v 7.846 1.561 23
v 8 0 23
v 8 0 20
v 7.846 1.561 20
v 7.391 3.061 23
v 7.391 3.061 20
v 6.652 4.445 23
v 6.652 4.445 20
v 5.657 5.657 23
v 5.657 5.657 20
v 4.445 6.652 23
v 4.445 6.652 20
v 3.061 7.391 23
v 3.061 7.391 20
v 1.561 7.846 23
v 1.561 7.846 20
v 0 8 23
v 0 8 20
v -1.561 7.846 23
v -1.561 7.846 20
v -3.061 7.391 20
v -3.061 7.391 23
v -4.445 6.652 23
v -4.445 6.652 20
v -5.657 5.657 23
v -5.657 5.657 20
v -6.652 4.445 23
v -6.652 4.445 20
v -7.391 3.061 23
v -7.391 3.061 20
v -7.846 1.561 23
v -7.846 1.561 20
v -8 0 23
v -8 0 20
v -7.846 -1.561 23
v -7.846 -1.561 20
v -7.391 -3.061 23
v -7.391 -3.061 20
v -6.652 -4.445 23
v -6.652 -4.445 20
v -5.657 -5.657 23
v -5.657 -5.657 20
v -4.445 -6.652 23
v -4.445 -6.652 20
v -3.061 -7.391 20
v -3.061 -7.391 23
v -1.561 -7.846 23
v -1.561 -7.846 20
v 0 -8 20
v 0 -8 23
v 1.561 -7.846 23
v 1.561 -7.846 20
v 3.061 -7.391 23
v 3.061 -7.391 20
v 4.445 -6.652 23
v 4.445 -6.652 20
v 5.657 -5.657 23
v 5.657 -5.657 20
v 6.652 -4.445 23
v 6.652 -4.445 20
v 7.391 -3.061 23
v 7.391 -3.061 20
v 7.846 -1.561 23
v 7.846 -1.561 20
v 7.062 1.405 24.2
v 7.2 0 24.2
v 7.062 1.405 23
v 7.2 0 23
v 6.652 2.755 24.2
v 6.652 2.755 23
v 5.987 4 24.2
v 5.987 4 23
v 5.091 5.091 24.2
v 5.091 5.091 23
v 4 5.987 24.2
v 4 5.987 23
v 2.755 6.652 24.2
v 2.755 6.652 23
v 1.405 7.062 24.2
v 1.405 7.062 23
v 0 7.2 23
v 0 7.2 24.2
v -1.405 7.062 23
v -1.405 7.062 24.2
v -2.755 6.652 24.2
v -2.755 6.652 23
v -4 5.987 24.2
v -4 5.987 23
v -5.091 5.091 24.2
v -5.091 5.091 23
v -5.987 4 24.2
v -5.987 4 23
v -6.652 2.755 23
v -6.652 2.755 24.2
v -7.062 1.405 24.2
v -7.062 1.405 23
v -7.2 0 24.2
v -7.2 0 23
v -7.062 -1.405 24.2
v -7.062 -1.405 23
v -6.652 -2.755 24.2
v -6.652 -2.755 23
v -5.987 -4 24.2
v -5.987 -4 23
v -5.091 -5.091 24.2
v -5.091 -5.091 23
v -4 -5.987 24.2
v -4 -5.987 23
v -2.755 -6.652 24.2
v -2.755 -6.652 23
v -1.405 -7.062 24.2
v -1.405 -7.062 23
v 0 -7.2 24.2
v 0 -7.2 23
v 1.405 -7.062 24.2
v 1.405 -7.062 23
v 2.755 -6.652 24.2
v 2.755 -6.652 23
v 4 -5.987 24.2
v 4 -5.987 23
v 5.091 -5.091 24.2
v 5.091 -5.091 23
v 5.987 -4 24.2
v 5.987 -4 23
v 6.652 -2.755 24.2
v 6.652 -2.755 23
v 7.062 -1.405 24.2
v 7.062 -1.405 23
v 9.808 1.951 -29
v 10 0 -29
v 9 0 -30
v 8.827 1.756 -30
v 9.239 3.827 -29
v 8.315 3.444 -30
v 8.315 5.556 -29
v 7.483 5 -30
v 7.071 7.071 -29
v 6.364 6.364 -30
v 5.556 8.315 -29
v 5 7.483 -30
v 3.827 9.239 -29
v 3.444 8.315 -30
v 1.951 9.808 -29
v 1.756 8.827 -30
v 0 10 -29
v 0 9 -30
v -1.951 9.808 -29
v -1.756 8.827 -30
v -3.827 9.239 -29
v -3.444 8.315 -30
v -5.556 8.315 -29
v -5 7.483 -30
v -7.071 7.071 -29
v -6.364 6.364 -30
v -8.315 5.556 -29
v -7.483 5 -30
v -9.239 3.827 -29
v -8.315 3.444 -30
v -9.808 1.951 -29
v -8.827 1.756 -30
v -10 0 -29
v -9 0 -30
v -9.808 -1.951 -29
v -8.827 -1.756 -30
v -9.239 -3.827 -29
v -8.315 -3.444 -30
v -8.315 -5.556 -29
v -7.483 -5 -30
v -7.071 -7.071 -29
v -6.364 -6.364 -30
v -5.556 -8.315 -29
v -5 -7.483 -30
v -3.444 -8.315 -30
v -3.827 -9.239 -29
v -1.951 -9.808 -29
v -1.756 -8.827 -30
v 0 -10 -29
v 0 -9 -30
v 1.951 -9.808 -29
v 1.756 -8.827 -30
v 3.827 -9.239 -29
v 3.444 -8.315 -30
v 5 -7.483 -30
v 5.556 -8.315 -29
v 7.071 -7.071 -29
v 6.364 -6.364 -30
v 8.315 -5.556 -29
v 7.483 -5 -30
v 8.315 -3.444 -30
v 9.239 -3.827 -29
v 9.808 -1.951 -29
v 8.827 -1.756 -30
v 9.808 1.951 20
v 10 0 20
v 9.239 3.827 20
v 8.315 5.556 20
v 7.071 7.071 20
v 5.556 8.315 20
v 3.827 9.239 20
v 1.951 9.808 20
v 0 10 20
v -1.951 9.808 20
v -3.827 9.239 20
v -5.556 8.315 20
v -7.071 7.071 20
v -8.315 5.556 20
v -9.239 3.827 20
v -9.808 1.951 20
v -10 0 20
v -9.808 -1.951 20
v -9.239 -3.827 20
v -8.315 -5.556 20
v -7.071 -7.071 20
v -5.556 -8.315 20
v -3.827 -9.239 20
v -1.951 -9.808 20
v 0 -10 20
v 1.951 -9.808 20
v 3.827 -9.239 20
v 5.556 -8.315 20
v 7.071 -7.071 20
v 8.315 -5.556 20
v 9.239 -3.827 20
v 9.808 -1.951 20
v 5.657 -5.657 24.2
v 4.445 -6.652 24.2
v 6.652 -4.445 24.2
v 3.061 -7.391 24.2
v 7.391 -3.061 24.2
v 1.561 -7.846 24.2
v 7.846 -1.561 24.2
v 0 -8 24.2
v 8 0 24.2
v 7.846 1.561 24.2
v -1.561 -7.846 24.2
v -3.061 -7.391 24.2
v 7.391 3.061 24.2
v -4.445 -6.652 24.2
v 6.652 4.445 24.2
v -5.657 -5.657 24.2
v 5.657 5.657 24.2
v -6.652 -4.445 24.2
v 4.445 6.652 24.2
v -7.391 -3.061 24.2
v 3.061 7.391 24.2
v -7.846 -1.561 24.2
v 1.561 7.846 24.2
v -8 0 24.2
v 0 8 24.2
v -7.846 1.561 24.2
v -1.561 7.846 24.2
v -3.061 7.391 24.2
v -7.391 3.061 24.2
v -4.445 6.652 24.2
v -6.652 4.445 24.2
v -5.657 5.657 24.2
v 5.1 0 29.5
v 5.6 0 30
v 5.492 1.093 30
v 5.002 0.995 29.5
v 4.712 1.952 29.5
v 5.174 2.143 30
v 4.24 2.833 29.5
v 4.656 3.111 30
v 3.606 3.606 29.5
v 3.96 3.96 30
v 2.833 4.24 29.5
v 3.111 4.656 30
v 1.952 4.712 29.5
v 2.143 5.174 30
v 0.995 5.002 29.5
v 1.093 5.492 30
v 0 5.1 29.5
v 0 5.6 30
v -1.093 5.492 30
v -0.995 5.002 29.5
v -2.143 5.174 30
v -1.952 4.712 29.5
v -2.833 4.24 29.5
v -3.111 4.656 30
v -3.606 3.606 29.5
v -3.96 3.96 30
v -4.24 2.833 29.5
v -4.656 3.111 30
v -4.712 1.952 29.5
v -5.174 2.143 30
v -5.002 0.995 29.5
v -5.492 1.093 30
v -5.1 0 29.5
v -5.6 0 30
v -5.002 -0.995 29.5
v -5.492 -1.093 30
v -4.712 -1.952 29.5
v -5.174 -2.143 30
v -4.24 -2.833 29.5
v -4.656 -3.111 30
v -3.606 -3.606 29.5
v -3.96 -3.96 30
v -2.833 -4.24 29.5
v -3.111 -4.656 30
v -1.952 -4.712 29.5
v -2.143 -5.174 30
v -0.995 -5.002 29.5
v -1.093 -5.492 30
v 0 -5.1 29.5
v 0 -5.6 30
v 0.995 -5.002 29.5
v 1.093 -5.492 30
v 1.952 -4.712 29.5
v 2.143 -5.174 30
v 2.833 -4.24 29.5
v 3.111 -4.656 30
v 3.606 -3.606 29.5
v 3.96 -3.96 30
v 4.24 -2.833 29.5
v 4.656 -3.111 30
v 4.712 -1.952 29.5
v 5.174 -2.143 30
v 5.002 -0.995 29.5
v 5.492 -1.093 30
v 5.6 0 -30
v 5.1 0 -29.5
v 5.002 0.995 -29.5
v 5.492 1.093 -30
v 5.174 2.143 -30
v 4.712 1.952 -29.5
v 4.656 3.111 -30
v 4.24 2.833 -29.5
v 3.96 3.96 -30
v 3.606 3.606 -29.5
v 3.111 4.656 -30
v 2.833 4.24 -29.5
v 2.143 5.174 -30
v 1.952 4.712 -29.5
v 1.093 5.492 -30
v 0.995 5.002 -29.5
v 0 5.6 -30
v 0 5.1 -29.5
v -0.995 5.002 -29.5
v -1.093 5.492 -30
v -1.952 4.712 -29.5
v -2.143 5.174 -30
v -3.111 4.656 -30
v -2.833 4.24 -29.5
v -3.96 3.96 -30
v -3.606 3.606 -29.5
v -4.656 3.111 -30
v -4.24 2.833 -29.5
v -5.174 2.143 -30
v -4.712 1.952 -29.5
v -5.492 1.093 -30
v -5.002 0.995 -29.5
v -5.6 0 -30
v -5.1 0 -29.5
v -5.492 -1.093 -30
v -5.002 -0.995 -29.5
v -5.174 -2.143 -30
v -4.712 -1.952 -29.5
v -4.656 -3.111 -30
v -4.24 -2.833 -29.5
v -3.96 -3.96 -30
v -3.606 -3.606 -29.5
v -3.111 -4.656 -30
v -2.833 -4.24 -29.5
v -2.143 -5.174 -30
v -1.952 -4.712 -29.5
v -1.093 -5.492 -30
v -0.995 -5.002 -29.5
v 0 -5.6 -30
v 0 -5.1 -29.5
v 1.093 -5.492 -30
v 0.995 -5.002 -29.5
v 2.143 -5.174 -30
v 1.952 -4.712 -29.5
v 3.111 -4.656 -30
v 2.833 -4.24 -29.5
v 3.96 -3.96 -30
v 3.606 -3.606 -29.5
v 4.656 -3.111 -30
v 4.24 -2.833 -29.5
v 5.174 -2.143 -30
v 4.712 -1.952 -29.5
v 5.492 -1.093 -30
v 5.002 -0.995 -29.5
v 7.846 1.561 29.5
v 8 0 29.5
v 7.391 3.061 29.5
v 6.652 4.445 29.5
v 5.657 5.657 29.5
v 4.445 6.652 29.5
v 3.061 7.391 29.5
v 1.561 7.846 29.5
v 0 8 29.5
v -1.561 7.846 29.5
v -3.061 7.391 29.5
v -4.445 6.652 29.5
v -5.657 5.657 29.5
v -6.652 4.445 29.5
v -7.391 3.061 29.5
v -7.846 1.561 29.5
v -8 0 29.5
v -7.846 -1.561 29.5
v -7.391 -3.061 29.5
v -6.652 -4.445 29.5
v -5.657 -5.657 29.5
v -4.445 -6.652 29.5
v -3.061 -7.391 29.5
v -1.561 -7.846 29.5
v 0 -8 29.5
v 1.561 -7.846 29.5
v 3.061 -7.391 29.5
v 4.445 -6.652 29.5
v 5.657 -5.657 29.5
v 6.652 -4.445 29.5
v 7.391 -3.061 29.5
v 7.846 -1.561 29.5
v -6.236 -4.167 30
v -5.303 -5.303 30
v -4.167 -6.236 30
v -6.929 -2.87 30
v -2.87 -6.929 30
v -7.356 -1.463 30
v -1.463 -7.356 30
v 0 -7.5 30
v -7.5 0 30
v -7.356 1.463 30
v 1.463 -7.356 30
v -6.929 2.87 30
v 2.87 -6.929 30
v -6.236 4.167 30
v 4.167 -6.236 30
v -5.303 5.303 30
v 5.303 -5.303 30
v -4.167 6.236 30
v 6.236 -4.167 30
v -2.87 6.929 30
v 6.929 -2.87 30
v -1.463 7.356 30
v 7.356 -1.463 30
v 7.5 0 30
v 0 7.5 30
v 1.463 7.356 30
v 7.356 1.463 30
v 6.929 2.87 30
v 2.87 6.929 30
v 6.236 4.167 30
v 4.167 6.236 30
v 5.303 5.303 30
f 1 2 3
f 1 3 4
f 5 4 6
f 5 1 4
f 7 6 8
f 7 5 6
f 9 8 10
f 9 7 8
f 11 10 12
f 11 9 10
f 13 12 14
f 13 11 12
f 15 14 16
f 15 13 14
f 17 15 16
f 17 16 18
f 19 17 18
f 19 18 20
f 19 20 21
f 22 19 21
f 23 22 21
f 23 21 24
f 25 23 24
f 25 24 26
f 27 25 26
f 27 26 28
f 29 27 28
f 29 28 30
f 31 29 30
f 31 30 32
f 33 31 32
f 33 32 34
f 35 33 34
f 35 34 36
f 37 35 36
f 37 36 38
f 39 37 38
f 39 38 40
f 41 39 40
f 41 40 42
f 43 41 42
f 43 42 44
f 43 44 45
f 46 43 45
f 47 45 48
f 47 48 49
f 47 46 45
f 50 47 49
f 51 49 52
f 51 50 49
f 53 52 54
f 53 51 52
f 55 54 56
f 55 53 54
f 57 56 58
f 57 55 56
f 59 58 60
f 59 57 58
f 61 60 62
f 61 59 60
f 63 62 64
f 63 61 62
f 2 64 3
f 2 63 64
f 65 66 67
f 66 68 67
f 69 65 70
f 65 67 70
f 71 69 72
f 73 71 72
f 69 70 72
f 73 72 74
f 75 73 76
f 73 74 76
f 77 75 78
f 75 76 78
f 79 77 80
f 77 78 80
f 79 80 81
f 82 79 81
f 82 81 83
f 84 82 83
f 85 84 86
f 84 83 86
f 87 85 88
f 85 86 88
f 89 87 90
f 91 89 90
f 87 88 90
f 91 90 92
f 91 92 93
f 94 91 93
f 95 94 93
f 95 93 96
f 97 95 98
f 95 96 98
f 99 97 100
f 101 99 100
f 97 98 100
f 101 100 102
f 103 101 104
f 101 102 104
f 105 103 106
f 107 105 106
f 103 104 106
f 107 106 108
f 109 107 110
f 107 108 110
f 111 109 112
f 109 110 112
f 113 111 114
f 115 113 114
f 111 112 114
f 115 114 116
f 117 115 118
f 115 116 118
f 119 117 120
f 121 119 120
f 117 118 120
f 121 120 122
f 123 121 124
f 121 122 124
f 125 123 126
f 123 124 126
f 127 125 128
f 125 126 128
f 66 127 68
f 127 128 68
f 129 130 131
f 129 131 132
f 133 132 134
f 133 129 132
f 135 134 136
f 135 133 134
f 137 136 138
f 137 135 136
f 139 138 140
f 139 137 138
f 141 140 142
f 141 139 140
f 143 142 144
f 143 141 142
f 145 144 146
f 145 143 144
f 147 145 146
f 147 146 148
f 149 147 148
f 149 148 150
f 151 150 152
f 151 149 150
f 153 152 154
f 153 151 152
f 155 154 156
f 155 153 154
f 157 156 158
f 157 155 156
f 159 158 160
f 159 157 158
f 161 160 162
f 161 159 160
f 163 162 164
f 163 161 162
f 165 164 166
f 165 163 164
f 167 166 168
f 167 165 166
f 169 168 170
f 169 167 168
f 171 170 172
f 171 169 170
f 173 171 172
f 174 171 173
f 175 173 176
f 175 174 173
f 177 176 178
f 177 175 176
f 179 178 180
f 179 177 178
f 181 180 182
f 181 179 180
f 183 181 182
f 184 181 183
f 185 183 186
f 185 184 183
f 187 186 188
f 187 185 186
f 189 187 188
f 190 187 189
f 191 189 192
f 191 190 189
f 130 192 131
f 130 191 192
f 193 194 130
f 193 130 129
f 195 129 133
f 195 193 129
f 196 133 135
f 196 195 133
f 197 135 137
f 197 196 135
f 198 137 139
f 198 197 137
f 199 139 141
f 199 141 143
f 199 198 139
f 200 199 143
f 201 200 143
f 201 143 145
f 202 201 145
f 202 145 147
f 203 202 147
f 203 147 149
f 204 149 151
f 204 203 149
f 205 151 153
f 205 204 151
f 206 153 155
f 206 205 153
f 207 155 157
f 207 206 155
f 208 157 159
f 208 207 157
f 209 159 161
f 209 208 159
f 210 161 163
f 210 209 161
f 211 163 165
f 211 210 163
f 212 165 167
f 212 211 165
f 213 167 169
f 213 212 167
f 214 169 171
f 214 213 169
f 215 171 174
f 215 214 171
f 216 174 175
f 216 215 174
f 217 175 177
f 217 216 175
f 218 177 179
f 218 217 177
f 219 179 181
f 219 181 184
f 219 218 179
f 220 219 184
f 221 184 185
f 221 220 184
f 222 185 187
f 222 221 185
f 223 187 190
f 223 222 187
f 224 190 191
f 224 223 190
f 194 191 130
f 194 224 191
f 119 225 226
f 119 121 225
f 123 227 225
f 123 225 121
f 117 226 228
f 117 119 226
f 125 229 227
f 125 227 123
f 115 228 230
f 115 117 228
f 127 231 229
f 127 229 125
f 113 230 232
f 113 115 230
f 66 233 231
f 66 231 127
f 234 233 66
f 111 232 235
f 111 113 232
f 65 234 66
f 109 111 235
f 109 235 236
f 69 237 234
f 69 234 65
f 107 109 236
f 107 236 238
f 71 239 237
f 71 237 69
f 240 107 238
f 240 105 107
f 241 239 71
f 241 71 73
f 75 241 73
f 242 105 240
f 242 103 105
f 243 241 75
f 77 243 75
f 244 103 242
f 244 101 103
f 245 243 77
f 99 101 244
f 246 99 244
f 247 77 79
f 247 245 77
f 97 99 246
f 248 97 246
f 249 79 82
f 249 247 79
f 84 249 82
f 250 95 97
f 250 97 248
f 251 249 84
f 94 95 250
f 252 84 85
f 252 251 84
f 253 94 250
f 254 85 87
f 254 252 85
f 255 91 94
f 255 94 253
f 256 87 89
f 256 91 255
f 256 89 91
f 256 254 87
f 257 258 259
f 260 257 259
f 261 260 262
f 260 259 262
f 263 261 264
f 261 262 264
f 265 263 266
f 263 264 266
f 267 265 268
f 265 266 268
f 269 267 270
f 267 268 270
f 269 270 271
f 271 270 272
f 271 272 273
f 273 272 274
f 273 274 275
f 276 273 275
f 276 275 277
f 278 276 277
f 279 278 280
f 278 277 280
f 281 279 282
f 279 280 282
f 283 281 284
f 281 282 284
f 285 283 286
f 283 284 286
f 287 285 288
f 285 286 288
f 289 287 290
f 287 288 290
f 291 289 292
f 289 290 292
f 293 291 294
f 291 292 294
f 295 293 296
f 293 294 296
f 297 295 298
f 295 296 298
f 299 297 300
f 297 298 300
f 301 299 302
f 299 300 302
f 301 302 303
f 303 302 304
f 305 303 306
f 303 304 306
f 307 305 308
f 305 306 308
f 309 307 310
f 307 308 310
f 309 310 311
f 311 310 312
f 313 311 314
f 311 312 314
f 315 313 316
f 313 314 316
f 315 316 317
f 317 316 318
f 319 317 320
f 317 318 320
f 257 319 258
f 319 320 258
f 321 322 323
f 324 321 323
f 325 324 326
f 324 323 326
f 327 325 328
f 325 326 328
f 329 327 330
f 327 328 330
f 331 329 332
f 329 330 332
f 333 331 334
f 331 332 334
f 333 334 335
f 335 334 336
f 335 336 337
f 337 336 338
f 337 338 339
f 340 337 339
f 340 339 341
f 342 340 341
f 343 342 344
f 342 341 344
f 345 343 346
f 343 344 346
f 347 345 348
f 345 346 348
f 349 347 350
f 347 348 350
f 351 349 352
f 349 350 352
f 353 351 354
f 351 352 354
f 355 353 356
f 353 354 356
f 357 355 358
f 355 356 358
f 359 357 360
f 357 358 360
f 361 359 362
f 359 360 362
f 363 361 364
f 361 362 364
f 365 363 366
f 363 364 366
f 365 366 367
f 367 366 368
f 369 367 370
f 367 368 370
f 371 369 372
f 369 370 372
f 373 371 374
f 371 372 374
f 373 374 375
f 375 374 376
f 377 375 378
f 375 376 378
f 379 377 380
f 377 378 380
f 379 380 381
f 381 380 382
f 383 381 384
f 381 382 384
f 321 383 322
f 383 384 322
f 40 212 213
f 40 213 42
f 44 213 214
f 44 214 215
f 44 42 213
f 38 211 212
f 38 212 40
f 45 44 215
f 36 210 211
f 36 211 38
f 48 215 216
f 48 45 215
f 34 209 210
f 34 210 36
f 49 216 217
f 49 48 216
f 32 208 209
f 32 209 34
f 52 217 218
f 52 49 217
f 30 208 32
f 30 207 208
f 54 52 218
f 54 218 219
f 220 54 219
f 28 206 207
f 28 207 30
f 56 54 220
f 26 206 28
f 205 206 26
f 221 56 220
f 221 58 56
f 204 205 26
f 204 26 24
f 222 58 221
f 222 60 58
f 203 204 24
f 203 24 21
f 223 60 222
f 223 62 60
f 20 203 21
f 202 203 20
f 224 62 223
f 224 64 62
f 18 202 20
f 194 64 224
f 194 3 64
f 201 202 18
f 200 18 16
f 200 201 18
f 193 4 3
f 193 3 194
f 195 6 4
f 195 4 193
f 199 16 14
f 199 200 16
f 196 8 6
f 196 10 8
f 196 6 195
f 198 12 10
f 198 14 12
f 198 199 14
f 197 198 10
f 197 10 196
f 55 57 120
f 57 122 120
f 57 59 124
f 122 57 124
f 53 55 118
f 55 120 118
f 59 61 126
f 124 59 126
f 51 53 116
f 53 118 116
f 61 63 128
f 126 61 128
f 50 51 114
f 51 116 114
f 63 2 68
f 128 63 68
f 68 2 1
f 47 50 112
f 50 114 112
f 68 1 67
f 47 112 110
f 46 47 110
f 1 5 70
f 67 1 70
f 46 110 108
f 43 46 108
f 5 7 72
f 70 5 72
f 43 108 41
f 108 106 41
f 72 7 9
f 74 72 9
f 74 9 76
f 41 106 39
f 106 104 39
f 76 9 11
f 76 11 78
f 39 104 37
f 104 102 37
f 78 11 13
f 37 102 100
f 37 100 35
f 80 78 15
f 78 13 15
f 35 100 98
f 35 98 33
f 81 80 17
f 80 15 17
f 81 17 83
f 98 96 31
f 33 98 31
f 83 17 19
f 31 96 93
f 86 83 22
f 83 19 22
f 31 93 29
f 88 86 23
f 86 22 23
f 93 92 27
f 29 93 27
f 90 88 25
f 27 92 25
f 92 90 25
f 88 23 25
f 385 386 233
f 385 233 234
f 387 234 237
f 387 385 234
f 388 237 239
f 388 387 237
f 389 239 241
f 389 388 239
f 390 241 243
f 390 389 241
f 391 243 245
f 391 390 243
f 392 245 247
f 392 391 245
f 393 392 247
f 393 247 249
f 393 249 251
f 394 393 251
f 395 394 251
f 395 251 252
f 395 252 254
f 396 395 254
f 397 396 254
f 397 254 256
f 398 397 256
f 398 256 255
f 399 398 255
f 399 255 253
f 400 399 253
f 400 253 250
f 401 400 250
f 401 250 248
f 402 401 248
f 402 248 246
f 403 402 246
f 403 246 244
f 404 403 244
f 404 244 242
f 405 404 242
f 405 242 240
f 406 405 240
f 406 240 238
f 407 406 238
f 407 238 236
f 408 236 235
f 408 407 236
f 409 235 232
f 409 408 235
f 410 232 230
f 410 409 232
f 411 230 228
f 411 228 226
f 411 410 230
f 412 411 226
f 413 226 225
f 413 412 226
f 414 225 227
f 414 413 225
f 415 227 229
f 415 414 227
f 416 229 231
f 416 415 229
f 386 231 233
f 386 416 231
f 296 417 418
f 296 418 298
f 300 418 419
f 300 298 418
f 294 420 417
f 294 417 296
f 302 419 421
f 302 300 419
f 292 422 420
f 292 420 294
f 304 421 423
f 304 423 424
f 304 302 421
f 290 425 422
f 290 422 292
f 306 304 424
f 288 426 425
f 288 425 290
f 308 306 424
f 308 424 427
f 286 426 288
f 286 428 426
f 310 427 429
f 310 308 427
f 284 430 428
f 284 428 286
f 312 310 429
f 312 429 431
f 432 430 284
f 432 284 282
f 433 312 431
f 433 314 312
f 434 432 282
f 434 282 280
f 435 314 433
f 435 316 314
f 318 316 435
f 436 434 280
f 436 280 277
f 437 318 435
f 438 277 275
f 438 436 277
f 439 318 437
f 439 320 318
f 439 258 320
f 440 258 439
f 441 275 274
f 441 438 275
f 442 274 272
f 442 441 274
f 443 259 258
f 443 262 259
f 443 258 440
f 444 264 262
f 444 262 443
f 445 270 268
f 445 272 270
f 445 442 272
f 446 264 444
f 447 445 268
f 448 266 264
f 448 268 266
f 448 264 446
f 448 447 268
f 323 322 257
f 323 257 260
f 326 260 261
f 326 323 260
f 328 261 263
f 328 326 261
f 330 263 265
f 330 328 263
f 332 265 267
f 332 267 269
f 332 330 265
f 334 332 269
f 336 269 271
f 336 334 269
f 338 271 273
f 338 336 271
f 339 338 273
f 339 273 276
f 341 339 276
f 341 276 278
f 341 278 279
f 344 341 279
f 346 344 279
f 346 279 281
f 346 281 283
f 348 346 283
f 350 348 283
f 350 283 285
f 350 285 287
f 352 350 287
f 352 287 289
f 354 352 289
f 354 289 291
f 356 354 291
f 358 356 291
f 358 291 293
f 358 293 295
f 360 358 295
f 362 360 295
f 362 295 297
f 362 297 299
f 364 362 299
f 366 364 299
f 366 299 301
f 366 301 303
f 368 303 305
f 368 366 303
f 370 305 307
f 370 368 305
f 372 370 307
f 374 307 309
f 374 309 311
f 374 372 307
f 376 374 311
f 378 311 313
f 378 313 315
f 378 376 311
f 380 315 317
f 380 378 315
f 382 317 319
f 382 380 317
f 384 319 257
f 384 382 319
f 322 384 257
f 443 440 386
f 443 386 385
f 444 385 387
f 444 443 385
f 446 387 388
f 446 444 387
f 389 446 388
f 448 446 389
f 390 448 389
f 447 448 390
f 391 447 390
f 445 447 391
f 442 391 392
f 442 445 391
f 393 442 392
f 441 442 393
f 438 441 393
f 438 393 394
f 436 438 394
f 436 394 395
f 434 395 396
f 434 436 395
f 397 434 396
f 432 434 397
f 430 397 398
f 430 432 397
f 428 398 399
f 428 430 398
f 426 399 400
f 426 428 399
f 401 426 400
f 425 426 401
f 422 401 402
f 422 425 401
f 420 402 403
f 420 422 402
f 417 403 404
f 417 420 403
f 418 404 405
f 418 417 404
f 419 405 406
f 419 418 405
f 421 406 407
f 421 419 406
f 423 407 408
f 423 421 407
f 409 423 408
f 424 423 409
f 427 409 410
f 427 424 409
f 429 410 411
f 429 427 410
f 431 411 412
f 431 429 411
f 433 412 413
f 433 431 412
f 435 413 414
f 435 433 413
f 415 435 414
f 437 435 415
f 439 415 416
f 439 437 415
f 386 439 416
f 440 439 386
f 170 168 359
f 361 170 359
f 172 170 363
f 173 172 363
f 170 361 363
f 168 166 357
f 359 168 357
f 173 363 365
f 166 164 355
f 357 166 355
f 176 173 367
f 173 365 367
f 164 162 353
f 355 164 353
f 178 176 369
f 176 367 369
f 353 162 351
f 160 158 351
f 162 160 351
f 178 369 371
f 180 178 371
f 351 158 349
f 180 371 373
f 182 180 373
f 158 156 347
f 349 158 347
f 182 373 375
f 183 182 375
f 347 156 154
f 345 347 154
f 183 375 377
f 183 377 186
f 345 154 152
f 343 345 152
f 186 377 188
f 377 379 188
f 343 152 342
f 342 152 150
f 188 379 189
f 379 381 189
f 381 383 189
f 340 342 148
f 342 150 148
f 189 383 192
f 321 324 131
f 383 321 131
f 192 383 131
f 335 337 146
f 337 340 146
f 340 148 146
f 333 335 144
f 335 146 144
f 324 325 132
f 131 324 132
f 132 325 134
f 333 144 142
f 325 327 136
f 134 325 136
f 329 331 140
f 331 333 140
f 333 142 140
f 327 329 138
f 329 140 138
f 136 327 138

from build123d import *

# Parameters (mm, degrees)
CROQUIS1_R              = 10
CROQUIS1_R_2            = 5.1
SALIENTE_EXTRUIR1_DEPTH = 30
CROQUIS2_OUTSIDE_W      = 35.266
CROQUIS2_OUTSIDE_H      = 35.266
CROQUIS2_OUTSIDE_R      = 8
CORTAR_EXTRUIR1_DEPTH   = 10
CHAFL_N1_SIZE           = 0.5
CROQUIS3_W              = 6
CROQUIS3_H              = 1.2
CHAFL_N2_SIZE           = 1


with BuildPart() as part:
    # Croquis1 → Saliente-Extruir1 (new, symmetric)
    with BuildSketch(Plane.XY):
        Circle(CROQUIS1_R)
        Circle(CROQUIS1_R_2, mode=Mode.SUBTRACT)
    extrude(amount=SALIENTE_EXTRUIR1_DEPTH, both=True)

    # Croquis2 outside → Cortar-Extruir1 (cut)
    with BuildSketch(Plane.XY.offset(30)):
        Rectangle(CROQUIS2_OUTSIDE_W, CROQUIS2_OUTSIDE_H)
        Circle(CROQUIS2_OUTSIDE_R, mode=Mode.SUBTRACT)
    extrude(amount=-CORTAR_EXTRUIR1_DEPTH, mode=Mode.SUBTRACT)

    # Chaflán1
    chafl_n1_edges = [part.edges().sort_by_distance(p)[0] for p in [
        (-8, 0, 30),
        (-5.1, 0, -30),
        (-5.1, 0, 30),
    ]]
    chamfer(chafl_n1_edges, length=CHAFL_N1_SIZE)

    # Croquis3 → Cortar-Revolución1 (revolve, cut)
    with BuildSketch(Plane(origin=(0, 0, 0), x_dir=(1, 0, 0), z_dir=(0, 1, 0))):
        with Locations((10.2, -23.6)):
            Rectangle(CROQUIS3_W, CROQUIS3_H)
    revolve(axis=Axis((0, 0, 0), (0, 0, 1)), mode=Mode.SUBTRACT)

    # Chaflán2
    chafl_n2_edges = [part.edges().sort_by_distance(p)[0] for p in [
        (-10, 0, -30),
    ]]
    chamfer(chafl_n2_edges, length=CHAFL_N2_SIZE)


solid = part.part
